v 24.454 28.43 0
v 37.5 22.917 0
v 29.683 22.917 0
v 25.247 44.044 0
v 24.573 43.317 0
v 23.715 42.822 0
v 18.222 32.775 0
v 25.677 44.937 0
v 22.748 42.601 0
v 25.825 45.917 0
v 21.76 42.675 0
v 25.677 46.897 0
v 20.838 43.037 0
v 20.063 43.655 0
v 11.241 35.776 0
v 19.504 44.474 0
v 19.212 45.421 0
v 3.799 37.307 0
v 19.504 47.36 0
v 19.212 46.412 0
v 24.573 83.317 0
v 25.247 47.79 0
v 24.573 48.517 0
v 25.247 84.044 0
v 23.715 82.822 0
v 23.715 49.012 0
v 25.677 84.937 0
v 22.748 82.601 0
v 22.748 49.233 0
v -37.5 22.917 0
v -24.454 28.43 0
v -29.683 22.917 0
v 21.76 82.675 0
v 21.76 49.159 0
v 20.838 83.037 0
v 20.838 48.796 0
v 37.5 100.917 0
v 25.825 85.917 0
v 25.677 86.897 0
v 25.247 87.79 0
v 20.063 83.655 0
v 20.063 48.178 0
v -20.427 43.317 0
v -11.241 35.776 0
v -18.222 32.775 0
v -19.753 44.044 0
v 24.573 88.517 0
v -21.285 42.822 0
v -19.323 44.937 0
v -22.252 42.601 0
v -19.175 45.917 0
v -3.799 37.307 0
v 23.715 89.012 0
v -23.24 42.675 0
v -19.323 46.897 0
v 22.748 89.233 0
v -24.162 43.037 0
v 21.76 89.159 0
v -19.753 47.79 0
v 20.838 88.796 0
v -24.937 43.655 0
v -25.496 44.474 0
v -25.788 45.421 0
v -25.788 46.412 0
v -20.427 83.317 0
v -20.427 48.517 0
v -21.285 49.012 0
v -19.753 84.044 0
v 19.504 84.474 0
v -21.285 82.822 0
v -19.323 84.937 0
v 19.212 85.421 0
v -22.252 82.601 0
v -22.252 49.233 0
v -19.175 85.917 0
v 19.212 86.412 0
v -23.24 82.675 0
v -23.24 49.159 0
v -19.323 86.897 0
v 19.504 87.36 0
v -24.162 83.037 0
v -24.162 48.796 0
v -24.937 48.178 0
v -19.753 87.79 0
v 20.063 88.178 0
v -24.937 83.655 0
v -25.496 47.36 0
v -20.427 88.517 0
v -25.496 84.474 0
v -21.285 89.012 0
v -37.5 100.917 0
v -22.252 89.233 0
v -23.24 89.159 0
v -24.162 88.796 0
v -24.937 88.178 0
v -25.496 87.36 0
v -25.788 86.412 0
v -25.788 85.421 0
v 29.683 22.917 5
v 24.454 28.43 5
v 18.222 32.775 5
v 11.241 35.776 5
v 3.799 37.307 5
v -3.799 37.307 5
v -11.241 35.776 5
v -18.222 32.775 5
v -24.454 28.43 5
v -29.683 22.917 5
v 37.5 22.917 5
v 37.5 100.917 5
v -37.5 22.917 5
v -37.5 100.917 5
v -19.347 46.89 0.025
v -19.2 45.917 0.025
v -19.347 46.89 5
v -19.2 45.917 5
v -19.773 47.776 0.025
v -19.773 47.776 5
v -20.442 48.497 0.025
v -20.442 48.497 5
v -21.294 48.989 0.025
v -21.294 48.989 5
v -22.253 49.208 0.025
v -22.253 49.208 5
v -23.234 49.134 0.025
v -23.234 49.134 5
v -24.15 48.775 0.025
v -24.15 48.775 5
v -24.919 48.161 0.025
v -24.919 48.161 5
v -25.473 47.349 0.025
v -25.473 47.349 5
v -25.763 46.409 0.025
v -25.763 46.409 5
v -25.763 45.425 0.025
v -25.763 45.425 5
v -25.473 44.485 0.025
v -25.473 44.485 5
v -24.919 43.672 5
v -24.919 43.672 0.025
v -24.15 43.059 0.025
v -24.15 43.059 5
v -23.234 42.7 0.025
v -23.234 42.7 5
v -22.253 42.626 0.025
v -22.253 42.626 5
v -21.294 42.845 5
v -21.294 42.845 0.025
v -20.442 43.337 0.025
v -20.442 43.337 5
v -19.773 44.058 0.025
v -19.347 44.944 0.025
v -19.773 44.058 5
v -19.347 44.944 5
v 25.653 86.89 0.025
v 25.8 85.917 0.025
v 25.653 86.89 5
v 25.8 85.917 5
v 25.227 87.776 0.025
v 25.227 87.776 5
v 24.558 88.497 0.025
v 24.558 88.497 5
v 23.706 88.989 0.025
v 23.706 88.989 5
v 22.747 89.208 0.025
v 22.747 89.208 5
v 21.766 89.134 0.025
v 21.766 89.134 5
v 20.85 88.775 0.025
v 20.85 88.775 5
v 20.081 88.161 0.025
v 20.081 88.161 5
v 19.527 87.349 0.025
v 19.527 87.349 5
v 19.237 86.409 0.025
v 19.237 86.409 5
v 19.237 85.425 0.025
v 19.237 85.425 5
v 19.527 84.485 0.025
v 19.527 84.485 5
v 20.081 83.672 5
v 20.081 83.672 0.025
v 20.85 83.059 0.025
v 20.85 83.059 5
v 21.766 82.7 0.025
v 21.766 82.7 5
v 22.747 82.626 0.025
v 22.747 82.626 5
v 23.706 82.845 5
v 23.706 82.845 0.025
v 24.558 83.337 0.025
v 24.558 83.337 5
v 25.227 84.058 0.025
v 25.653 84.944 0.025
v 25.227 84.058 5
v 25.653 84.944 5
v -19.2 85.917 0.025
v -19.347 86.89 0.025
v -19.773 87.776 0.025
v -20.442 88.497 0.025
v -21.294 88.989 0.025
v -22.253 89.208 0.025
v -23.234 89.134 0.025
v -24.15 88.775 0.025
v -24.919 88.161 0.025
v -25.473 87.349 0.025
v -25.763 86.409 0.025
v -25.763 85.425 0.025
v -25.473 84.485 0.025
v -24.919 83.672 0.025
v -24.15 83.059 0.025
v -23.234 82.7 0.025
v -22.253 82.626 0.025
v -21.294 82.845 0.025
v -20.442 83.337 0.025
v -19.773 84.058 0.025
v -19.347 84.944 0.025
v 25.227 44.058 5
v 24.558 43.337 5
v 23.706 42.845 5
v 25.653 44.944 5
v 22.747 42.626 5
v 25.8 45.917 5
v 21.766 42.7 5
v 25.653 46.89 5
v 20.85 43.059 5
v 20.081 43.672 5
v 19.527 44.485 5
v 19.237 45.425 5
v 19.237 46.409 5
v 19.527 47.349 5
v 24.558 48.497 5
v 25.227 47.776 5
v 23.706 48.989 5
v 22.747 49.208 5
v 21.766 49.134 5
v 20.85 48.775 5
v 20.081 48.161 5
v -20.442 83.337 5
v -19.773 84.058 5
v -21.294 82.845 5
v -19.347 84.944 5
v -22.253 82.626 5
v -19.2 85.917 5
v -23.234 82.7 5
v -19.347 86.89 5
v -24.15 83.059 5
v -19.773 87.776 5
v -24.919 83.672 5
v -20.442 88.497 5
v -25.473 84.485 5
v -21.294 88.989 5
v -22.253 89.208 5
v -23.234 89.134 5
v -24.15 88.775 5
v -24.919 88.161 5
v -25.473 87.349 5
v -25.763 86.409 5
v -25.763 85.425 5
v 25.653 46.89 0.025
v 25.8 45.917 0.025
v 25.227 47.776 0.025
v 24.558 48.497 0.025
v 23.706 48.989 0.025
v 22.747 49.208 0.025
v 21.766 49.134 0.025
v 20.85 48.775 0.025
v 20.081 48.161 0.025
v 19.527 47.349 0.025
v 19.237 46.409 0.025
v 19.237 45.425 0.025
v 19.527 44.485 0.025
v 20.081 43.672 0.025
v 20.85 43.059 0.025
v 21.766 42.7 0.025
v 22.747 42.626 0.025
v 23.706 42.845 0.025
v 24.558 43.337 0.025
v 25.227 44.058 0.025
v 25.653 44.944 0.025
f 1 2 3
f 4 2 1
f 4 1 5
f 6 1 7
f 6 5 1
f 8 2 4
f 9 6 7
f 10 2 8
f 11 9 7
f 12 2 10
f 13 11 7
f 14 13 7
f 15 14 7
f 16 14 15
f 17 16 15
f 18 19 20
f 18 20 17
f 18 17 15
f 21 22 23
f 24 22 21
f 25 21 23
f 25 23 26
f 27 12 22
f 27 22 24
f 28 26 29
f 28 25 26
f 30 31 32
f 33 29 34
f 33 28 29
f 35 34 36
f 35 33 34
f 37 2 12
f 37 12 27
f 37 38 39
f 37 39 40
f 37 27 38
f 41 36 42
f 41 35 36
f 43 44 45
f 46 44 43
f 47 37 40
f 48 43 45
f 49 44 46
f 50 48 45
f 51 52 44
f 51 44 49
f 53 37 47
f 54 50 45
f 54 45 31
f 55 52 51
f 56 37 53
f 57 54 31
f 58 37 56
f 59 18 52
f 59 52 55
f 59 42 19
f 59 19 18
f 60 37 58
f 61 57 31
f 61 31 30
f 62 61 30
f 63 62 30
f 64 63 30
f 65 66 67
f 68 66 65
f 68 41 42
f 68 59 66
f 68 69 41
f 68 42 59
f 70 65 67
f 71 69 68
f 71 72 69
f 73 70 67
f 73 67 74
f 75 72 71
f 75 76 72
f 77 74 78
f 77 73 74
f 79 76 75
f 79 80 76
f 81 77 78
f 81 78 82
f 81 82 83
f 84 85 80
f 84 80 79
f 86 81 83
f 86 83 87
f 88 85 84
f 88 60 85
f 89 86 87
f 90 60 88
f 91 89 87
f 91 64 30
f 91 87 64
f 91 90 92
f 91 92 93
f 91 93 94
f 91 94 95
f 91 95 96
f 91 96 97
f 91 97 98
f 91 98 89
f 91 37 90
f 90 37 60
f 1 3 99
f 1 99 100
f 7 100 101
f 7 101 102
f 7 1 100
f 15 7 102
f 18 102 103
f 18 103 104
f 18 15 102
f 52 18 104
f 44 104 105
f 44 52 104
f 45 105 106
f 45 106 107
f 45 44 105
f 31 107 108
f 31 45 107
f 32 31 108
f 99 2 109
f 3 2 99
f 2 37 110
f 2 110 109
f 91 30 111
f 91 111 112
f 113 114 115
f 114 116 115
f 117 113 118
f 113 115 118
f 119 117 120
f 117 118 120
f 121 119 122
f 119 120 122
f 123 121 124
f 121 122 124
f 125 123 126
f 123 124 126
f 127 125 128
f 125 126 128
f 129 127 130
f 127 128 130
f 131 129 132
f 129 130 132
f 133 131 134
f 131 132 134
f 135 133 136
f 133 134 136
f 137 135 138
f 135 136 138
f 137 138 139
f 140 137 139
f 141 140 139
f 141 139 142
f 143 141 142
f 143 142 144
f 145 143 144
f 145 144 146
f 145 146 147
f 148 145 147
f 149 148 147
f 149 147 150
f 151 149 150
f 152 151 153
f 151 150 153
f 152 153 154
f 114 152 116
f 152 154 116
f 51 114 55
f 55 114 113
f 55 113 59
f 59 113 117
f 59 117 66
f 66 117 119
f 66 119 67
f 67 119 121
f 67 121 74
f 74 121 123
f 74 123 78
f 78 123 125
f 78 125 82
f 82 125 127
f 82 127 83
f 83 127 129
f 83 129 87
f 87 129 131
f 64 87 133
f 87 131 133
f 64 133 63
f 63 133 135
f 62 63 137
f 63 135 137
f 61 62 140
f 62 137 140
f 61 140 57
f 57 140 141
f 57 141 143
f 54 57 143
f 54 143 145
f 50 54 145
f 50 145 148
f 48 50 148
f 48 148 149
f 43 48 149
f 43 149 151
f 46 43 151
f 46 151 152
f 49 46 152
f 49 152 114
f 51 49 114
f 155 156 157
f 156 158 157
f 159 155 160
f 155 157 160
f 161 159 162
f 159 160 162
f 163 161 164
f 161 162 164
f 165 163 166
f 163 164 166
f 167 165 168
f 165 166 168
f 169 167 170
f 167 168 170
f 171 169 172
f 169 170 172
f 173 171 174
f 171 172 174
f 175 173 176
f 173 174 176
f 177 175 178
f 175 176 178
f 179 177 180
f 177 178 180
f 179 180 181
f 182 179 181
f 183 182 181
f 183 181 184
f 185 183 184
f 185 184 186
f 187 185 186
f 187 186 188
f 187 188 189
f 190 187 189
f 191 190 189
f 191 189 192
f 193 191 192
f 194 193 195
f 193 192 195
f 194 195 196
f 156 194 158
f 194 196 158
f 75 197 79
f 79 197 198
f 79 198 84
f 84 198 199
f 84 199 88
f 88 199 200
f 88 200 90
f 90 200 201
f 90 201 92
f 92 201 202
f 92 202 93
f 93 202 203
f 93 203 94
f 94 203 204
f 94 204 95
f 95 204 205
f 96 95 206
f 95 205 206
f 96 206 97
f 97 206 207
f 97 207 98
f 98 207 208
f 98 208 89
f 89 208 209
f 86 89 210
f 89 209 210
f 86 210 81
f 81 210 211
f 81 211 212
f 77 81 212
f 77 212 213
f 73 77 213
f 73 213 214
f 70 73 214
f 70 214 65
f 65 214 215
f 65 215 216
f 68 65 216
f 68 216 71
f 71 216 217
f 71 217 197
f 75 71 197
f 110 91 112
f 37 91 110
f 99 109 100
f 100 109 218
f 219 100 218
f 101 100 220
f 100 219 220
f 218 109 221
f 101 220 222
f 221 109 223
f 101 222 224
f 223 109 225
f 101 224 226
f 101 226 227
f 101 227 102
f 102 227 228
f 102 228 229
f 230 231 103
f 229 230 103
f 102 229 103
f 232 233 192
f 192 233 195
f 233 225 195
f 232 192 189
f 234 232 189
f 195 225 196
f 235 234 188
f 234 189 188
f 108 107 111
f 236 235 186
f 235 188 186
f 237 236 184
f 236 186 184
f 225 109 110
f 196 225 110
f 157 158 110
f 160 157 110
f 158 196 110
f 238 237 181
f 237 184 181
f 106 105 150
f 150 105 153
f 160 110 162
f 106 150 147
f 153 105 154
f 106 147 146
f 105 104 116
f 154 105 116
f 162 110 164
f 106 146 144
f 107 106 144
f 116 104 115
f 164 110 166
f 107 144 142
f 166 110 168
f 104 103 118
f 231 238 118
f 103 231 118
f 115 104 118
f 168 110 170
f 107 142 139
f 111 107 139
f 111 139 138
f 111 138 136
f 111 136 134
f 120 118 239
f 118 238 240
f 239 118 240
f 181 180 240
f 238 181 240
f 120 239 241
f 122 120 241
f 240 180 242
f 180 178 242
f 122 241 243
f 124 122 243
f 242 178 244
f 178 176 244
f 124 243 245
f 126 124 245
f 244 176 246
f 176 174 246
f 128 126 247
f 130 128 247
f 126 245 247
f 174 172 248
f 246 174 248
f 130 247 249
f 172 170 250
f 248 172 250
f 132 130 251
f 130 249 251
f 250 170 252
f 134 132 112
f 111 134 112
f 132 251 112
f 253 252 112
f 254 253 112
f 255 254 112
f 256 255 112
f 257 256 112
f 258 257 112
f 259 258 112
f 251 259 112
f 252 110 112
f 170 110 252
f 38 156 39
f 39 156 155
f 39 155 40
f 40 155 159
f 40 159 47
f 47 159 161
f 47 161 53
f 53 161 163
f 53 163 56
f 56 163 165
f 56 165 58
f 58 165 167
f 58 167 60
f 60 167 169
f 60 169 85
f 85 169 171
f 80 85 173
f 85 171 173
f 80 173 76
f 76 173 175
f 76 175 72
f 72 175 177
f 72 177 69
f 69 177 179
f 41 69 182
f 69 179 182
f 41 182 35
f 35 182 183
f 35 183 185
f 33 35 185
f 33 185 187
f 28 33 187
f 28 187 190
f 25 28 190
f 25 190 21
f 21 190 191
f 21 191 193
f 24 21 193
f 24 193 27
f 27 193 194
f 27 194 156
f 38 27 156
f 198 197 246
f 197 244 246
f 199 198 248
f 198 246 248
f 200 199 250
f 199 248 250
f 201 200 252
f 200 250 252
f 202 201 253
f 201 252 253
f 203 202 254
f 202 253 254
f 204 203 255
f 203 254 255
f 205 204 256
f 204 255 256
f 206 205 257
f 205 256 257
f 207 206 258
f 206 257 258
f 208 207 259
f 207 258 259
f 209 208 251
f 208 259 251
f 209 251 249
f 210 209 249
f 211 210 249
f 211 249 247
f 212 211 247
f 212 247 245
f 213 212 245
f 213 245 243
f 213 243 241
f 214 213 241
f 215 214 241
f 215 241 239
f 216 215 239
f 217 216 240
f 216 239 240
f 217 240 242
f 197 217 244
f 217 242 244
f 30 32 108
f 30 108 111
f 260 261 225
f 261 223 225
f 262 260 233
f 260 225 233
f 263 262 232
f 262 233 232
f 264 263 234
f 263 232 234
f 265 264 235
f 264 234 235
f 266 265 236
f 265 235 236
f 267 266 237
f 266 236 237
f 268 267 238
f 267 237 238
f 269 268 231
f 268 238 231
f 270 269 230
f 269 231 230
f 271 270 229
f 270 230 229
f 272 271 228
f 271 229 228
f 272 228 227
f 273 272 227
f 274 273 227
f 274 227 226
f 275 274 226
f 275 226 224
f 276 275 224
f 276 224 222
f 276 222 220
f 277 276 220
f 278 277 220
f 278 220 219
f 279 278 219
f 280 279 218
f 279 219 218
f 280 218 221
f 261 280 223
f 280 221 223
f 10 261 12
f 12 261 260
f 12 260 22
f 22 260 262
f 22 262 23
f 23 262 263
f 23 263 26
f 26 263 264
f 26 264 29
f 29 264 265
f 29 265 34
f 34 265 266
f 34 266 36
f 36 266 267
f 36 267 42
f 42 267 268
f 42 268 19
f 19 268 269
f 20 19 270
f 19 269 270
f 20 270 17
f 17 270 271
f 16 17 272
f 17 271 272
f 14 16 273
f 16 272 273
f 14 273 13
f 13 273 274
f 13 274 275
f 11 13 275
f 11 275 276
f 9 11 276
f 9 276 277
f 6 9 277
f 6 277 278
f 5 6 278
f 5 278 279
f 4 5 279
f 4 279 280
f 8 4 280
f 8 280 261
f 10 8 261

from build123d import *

# Parameters (mm, degrees)
BOSS_EXTRUDE1_DEPTH            = 5
M6_CLEARANCE_HOLE1_D           = 6.6
M6_CLEARANCE_HOLE1_CSINK_D     = 6.65
M6_CLEARANCE_HOLE1_CSINK_ANGLE = 90


with BuildPart() as part:
    # Sketch1 → Boss-Extrude1 (new body)
    with BuildSketch(Plane.XY):
        with BuildLine():
            Line((-37.5, 22.9169235), (-37.5, 60.9169235))
            Line((-37.5, 60.9169235), (-37.5, 100.9169235))
            Line((-37.5, 100.9169235), (37.5, 100.9169235))
            Line((37.5, 100.9169235), (37.5, 60.9169235))
            Line((37.5, 60.9169235), (37.5, 22.9169235))
            Line((37.5, 22.9169235), (29.682732645, 22.9169235))
            ThreePointArc((29.682732645, 22.9169235), (0, 37.5), (-29.682732645, 22.9169235))
            Line((-29.682732645, 22.9169235), (-37.5, 22.9169235))
        make_face()
    extrude(amount=BOSS_EXTRUDE1_DEPTH)

    # M6 Clearance Hole1 (through all)
    with Locations(Plane(origin=(0, 0, 0), x_dir=(-1, 0, 0), z_dir=(0, 0, -1))):
        with Locations((-22.5, 45.9169235), (22.5, 45.9169235), (22.5, 85.9169235), (-22.5, 85.9169235)):
            CounterSinkHole(M6_CLEARANCE_HOLE1_D / 2, M6_CLEARANCE_HOLE1_CSINK_D / 2, counter_sink_angle=M6_CLEARANCE_HOLE1_CSINK_ANGLE)


solid = part.part
